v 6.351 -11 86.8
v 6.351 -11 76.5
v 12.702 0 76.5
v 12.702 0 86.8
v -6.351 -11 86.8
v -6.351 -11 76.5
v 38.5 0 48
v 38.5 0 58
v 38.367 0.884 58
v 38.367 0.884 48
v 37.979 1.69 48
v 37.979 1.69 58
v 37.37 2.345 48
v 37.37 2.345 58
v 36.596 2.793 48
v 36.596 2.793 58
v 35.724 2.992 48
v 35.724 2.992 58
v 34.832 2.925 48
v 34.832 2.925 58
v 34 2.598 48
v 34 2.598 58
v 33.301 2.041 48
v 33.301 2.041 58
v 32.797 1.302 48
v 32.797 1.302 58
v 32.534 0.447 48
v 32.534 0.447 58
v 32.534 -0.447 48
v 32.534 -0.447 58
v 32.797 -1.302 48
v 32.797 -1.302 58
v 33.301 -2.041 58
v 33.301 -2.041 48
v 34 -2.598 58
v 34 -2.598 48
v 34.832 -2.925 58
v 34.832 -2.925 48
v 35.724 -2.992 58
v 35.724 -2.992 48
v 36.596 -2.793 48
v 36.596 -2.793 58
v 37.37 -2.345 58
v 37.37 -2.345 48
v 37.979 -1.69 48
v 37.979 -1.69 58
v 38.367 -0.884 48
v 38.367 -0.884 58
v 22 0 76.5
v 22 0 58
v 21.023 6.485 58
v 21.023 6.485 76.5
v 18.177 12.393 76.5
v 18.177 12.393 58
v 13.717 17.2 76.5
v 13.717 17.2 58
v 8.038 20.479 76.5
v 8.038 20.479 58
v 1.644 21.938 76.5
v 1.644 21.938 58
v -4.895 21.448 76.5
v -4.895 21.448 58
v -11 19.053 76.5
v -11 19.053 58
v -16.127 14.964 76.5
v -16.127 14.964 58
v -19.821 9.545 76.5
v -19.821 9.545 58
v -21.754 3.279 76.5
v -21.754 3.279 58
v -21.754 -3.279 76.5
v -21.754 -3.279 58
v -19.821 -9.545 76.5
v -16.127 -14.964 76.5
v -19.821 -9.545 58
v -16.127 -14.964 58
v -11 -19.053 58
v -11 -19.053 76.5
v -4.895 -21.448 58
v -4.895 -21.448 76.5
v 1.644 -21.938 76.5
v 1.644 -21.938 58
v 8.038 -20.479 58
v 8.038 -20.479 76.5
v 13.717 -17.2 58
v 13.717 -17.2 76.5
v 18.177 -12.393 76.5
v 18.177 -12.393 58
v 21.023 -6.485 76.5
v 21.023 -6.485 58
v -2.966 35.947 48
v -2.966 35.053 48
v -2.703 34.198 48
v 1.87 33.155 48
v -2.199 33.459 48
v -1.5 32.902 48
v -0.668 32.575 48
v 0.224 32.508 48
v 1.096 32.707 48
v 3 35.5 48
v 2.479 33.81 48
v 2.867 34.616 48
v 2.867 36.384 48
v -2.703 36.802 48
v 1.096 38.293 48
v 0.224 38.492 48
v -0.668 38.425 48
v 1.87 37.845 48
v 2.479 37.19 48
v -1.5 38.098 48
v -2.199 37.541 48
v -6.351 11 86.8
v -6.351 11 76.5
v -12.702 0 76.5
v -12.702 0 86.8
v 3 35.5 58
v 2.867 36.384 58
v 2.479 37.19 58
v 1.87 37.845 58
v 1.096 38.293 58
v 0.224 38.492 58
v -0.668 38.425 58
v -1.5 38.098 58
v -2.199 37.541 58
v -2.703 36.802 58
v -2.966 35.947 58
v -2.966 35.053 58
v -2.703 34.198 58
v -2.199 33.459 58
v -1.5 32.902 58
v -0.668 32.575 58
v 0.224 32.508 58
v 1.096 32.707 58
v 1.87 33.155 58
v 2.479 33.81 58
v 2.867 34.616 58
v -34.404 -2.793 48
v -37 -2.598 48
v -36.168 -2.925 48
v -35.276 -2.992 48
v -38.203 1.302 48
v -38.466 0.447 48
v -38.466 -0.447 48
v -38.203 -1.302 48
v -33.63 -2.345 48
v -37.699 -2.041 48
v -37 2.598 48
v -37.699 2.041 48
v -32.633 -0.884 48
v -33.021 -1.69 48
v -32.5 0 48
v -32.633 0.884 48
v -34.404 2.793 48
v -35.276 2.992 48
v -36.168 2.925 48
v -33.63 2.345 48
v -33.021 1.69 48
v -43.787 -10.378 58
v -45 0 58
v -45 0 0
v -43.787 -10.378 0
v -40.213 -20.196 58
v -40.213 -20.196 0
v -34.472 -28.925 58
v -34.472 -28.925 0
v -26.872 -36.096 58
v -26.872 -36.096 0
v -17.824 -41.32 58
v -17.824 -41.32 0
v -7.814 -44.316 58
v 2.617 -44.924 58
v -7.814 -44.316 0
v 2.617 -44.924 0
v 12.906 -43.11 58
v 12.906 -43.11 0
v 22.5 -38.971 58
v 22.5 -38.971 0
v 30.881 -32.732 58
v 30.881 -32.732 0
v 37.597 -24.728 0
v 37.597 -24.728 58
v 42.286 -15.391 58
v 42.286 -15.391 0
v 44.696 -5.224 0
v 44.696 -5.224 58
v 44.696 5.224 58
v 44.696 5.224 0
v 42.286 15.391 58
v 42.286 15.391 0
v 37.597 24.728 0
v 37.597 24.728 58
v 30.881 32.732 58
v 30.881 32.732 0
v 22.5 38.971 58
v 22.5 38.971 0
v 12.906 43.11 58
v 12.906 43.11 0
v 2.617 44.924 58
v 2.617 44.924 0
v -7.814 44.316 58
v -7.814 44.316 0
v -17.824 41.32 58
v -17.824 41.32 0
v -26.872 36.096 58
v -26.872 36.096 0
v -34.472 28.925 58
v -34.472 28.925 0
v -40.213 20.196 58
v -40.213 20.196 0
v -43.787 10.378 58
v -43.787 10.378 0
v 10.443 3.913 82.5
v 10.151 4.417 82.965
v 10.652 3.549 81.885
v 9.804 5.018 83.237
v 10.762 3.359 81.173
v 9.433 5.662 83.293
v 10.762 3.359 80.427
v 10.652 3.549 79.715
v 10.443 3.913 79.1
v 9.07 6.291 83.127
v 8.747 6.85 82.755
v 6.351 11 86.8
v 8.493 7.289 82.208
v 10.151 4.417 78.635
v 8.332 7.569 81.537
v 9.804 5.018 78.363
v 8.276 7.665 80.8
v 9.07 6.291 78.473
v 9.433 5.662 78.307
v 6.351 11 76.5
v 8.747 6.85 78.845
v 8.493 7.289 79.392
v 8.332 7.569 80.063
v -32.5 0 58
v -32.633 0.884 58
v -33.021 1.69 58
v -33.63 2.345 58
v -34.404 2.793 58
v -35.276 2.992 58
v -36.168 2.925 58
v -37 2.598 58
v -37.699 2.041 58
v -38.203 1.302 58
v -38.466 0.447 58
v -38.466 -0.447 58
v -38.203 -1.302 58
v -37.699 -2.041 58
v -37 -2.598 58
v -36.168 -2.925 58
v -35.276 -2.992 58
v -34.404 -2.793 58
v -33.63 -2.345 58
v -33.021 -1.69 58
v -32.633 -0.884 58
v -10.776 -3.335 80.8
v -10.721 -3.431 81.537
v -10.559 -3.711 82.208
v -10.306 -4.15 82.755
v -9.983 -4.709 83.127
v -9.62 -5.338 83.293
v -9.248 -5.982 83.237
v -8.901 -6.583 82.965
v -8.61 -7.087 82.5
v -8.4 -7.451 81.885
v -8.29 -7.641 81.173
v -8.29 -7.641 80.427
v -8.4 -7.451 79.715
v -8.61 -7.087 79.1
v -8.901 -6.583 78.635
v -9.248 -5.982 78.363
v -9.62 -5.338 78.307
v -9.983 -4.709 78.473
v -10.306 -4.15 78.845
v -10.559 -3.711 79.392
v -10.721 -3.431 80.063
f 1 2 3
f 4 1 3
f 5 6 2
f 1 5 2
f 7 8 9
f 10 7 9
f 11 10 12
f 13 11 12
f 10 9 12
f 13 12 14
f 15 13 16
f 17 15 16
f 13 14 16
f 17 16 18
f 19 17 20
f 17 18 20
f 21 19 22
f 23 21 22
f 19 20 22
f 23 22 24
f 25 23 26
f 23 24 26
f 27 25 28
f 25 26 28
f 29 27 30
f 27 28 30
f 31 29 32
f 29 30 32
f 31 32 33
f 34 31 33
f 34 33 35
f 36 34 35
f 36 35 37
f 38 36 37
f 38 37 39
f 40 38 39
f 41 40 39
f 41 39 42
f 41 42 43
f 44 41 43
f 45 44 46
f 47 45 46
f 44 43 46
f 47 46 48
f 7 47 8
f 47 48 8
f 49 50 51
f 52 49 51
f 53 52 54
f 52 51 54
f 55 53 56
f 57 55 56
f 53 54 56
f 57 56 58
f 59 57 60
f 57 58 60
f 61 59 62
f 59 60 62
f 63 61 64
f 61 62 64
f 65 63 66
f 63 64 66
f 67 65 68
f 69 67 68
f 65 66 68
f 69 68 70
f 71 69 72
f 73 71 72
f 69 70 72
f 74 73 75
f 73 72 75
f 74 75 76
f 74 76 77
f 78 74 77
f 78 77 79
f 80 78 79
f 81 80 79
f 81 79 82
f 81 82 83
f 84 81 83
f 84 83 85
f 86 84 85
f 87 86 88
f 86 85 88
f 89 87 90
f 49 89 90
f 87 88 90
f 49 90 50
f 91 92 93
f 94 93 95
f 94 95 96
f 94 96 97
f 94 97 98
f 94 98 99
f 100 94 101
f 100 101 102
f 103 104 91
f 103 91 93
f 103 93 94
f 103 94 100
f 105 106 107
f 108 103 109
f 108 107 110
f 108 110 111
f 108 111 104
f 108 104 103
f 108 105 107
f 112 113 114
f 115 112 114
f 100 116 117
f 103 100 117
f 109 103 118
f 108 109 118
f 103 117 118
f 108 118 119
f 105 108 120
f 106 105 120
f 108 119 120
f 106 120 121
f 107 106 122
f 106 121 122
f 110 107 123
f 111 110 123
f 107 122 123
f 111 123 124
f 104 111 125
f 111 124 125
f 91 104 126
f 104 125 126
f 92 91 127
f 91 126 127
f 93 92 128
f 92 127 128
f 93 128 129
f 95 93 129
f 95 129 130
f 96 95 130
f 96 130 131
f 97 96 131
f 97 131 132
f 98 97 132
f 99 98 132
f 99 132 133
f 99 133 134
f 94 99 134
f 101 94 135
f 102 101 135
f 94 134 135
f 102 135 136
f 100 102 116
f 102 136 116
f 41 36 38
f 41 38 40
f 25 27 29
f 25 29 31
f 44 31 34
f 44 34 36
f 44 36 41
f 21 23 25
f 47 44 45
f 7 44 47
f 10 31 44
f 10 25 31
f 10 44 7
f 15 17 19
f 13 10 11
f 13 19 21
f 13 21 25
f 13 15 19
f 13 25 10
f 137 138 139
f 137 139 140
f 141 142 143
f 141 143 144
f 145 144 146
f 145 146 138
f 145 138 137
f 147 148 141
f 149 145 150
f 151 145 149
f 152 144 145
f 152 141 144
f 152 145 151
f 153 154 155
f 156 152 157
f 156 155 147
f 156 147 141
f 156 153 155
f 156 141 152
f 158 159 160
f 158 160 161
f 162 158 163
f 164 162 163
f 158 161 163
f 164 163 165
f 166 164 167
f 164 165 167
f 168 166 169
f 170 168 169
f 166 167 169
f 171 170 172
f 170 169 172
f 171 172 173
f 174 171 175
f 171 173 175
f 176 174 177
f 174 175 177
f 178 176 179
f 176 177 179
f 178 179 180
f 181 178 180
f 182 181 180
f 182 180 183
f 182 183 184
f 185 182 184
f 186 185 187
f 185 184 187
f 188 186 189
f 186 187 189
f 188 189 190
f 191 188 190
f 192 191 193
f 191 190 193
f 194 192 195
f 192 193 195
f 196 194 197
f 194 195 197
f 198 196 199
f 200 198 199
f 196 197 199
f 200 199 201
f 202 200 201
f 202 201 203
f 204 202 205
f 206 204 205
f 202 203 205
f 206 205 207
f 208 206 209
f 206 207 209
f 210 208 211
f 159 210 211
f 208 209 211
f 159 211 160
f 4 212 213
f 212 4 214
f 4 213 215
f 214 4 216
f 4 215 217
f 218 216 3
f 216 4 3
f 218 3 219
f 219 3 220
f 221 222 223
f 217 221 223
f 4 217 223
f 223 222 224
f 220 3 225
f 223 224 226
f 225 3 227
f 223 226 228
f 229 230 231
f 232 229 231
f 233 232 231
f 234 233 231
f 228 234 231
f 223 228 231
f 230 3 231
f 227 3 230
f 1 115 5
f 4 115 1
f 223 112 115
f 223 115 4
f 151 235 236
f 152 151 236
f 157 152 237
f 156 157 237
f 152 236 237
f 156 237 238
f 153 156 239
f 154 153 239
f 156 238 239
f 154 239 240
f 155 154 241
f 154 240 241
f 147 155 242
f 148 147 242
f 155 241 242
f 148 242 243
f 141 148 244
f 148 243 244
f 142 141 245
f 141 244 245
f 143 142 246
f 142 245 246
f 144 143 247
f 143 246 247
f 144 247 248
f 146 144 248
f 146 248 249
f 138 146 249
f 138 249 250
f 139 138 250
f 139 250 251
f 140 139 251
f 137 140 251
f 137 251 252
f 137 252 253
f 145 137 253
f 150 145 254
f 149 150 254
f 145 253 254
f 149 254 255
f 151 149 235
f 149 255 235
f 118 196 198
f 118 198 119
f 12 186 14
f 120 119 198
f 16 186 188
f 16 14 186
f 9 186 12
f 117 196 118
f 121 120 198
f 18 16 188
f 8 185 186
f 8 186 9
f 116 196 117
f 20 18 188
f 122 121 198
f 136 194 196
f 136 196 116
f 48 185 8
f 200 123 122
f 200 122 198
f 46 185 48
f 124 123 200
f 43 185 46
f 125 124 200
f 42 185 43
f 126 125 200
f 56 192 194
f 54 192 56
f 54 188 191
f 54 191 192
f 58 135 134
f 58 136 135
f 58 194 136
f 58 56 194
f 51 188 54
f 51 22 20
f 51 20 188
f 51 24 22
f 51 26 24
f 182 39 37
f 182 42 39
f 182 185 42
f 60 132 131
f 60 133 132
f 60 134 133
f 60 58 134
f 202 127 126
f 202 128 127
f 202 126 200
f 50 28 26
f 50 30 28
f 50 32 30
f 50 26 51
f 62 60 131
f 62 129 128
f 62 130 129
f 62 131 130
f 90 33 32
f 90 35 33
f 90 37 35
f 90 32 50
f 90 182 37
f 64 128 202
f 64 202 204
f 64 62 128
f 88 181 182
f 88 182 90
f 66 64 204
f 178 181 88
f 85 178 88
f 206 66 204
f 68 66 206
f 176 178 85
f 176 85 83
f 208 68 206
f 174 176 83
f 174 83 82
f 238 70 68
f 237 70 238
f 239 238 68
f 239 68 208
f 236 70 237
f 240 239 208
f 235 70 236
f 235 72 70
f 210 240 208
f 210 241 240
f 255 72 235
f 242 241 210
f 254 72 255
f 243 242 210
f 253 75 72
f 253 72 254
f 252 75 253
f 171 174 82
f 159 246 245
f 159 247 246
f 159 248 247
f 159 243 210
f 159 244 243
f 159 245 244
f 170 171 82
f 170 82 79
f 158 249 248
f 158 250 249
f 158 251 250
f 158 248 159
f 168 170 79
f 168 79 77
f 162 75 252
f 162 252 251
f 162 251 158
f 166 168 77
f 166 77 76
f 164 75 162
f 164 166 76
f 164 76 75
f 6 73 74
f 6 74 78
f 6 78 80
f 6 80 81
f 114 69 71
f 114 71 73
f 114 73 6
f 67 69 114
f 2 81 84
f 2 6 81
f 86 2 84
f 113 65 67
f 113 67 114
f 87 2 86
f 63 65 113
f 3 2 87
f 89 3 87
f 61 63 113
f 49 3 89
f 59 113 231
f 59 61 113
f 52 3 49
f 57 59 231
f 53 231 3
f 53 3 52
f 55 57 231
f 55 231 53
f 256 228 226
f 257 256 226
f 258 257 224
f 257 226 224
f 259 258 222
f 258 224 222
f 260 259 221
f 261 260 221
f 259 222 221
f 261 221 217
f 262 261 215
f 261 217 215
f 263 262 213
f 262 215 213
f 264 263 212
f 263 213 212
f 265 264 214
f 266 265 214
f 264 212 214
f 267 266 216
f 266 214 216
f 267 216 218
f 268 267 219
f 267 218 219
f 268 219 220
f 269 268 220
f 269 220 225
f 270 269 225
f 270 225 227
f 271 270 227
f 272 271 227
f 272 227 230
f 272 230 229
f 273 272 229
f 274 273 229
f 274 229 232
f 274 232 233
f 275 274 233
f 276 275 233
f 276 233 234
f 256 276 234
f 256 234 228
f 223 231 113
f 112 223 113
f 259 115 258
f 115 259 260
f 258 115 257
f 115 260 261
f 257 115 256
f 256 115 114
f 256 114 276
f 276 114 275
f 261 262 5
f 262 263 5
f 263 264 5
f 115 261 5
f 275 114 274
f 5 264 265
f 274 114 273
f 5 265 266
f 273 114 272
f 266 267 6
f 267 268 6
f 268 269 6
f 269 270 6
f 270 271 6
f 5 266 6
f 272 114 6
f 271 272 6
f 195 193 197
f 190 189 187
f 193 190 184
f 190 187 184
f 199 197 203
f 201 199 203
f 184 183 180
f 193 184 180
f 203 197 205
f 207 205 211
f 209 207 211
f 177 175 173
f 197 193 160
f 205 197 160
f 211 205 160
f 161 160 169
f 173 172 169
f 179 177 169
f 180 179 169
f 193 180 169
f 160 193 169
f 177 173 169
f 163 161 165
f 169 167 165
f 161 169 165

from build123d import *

# Parameters (mm, degrees)
CROQUIS1_R              = 45
SALIENTE_EXTRUIR1_DEPTH = 58
CROQUIS2_R              = 22
SALIENTE_EXTRUIR2_DEPTH = 18.5
SALIENTE_EXTRUIR3_DEPTH = 10.3
CROQUIS4_R              = 2.5
CORTAR_EXTRUIR1_DEPTH   = 115.269878576
CROQUIS5_R              = 3
CORTAR_EXTRUIR2_DEPTH   = 10


with BuildPart() as part:
    # Croquis1 → Saliente-Extruir1 (new body)
    with BuildSketch(Plane.XY):
        with Locations(Location((0, 0, 0), (0, 0, 180))):
            Circle(CROQUIS1_R)
    extrude(amount=SALIENTE_EXTRUIR1_DEPTH)

    # Croquis2 → Saliente-Extruir2 (add)
    with BuildSketch(Plane.XY.offset(58)):
        Circle(CROQUIS2_R)
    extrude(amount=SALIENTE_EXTRUIR2_DEPTH)

    # Croquis3 → Saliente-Extruir3 (add)
    with BuildSketch(Plane.XY.offset(76.5)):
        Polygon((12.701705922, 0), (6.350852961, 11), (-6.350852961, 11), (-12.701705922, 0), (-6.350852961, -11), (6.350852961, -11), align=None)
    extrude(amount=SALIENTE_EXTRUIR3_DEPTH)

    # Croquis4 → Cortar-Extruir1 (cut, through all)
    with BuildSketch(Plane(origin=(9.526279442, 5.5, 0), x_dir=(0, 0, -1), z_dir=(0.8660254037844384, 0.5000000000000003, 0))):
        with Locations(Location((-80.8, 0, 0), (0, 0, 90))):
            Circle(CROQUIS4_R)
    extrude(amount=-CORTAR_EXTRUIR1_DEPTH, mode=Mode.SUBTRACT)

    # Croquis5 → Cortar-Extruir2 (cut)
    with BuildSketch(Plane.XY.offset(58)):
        with Locations((-35.5, 0)):
            Circle(CROQUIS5_R)
        with Locations((35.5, 0)):
            Circle(CROQUIS5_R)
        with Locations((0, 35.5)):
            Circle(CROQUIS5_R)
    extrude(amount=-CORTAR_EXTRUIR2_DEPTH, mode=Mode.SUBTRACT)


solid = part.part
